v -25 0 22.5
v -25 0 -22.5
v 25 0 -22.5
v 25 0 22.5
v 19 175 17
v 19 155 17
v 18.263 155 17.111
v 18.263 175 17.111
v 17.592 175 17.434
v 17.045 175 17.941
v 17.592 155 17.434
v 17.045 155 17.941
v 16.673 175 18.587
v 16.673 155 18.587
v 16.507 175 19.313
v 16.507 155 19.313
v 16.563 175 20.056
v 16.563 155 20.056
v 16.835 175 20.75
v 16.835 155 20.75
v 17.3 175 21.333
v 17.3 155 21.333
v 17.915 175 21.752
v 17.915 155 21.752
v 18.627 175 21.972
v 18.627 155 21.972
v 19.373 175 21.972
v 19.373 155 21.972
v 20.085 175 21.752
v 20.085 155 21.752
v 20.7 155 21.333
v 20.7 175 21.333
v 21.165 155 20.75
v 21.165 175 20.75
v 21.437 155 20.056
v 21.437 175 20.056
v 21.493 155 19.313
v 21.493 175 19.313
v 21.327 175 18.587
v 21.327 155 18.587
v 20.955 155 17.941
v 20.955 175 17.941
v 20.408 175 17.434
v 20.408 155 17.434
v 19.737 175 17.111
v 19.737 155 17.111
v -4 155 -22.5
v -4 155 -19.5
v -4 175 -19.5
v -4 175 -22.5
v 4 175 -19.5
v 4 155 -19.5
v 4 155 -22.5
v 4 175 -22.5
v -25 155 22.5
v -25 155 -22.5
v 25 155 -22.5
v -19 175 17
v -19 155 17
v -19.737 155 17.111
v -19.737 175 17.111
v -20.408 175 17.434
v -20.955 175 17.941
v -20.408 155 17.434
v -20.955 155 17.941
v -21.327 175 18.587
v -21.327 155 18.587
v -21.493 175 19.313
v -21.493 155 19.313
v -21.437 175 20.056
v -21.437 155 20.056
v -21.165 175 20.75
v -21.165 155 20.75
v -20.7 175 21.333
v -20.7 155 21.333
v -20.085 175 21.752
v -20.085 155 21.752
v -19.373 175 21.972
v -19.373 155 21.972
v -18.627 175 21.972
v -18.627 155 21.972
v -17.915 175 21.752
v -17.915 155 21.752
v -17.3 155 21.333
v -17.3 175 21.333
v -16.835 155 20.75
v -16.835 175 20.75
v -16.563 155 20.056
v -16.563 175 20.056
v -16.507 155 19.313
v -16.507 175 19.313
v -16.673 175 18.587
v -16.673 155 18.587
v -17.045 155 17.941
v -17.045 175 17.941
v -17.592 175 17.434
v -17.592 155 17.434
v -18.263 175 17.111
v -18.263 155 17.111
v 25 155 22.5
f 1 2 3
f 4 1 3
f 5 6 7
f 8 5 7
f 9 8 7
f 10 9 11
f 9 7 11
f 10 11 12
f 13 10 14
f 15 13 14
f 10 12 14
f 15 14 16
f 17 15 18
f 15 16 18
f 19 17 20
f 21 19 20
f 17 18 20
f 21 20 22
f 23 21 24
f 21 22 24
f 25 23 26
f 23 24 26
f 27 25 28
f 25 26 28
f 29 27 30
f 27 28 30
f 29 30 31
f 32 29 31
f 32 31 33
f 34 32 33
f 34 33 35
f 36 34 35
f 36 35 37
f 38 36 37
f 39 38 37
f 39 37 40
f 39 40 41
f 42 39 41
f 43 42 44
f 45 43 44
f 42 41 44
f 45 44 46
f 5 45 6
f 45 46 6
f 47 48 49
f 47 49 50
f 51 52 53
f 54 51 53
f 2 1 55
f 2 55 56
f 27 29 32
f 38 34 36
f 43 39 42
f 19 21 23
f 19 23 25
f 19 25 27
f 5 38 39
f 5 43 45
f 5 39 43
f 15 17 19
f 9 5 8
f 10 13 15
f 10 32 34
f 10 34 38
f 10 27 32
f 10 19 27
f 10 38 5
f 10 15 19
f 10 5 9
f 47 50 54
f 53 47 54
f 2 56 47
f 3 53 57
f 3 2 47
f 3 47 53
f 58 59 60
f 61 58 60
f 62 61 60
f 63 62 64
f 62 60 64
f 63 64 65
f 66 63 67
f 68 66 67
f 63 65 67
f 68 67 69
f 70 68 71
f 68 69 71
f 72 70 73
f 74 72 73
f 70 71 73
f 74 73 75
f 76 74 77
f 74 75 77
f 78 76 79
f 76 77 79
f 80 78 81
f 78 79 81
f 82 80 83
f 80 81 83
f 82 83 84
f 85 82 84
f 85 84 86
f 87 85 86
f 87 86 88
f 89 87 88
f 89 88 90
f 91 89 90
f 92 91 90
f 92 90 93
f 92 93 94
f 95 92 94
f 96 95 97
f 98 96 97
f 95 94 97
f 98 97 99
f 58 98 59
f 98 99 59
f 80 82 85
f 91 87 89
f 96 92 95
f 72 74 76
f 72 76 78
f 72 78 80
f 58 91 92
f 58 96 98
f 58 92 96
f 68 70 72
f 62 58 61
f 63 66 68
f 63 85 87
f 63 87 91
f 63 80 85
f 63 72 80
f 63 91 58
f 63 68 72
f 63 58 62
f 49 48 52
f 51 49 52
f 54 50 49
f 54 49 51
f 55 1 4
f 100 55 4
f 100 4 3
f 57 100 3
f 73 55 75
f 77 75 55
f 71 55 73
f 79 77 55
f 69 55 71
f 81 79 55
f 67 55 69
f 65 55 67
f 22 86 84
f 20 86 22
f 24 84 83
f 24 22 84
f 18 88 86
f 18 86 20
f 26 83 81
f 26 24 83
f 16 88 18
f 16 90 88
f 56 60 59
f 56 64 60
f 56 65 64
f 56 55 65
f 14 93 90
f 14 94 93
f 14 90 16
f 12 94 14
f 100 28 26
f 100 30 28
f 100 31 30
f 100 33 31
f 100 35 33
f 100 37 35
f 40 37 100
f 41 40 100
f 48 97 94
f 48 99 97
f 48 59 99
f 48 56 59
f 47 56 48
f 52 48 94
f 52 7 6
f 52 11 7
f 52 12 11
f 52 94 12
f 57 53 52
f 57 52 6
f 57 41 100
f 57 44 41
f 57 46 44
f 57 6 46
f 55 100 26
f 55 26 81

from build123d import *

# Parameters (mm, degrees)
SKETCH_1_W      = 50
SKETCH_1_H      = 45
EXTRUDE_1_DEPTH = 155
SKETCH_2_R      = 2.5
SKETCH_2_W      = 8
SKETCH_2_H      = 3
EXTRUDE_2_DEPTH = 20


with BuildPart() as part:
    # 草图1 → 凸台-拉伸1 (new body)
    with BuildSketch(Plane(origin=(0, 0, 0), x_dir=(1, 0, 0), z_dir=(0, 1, 0))):
        Rectangle(SKETCH_1_W, SKETCH_1_H)
    extrude(amount=EXTRUDE_1_DEPTH)

    # 草图2 → 凸台-拉伸2 (add)
    with BuildSketch(Plane(origin=(0, 155, 0), x_dir=(1, 0, 0), z_dir=(0, 1, 0))):
        with Locations(Location((-19, -19.5, 0), (0, 0, 90))):
            Circle(SKETCH_2_R)
        with Locations(Location((19, -19.5, 0), (0, 0, 90))):
            Circle(SKETCH_2_R)
        with Locations((0, 21)):
            Rectangle(SKETCH_2_W, SKETCH_2_H)
    extrude(amount=EXTRUDE_2_DEPTH)


solid = part.part
